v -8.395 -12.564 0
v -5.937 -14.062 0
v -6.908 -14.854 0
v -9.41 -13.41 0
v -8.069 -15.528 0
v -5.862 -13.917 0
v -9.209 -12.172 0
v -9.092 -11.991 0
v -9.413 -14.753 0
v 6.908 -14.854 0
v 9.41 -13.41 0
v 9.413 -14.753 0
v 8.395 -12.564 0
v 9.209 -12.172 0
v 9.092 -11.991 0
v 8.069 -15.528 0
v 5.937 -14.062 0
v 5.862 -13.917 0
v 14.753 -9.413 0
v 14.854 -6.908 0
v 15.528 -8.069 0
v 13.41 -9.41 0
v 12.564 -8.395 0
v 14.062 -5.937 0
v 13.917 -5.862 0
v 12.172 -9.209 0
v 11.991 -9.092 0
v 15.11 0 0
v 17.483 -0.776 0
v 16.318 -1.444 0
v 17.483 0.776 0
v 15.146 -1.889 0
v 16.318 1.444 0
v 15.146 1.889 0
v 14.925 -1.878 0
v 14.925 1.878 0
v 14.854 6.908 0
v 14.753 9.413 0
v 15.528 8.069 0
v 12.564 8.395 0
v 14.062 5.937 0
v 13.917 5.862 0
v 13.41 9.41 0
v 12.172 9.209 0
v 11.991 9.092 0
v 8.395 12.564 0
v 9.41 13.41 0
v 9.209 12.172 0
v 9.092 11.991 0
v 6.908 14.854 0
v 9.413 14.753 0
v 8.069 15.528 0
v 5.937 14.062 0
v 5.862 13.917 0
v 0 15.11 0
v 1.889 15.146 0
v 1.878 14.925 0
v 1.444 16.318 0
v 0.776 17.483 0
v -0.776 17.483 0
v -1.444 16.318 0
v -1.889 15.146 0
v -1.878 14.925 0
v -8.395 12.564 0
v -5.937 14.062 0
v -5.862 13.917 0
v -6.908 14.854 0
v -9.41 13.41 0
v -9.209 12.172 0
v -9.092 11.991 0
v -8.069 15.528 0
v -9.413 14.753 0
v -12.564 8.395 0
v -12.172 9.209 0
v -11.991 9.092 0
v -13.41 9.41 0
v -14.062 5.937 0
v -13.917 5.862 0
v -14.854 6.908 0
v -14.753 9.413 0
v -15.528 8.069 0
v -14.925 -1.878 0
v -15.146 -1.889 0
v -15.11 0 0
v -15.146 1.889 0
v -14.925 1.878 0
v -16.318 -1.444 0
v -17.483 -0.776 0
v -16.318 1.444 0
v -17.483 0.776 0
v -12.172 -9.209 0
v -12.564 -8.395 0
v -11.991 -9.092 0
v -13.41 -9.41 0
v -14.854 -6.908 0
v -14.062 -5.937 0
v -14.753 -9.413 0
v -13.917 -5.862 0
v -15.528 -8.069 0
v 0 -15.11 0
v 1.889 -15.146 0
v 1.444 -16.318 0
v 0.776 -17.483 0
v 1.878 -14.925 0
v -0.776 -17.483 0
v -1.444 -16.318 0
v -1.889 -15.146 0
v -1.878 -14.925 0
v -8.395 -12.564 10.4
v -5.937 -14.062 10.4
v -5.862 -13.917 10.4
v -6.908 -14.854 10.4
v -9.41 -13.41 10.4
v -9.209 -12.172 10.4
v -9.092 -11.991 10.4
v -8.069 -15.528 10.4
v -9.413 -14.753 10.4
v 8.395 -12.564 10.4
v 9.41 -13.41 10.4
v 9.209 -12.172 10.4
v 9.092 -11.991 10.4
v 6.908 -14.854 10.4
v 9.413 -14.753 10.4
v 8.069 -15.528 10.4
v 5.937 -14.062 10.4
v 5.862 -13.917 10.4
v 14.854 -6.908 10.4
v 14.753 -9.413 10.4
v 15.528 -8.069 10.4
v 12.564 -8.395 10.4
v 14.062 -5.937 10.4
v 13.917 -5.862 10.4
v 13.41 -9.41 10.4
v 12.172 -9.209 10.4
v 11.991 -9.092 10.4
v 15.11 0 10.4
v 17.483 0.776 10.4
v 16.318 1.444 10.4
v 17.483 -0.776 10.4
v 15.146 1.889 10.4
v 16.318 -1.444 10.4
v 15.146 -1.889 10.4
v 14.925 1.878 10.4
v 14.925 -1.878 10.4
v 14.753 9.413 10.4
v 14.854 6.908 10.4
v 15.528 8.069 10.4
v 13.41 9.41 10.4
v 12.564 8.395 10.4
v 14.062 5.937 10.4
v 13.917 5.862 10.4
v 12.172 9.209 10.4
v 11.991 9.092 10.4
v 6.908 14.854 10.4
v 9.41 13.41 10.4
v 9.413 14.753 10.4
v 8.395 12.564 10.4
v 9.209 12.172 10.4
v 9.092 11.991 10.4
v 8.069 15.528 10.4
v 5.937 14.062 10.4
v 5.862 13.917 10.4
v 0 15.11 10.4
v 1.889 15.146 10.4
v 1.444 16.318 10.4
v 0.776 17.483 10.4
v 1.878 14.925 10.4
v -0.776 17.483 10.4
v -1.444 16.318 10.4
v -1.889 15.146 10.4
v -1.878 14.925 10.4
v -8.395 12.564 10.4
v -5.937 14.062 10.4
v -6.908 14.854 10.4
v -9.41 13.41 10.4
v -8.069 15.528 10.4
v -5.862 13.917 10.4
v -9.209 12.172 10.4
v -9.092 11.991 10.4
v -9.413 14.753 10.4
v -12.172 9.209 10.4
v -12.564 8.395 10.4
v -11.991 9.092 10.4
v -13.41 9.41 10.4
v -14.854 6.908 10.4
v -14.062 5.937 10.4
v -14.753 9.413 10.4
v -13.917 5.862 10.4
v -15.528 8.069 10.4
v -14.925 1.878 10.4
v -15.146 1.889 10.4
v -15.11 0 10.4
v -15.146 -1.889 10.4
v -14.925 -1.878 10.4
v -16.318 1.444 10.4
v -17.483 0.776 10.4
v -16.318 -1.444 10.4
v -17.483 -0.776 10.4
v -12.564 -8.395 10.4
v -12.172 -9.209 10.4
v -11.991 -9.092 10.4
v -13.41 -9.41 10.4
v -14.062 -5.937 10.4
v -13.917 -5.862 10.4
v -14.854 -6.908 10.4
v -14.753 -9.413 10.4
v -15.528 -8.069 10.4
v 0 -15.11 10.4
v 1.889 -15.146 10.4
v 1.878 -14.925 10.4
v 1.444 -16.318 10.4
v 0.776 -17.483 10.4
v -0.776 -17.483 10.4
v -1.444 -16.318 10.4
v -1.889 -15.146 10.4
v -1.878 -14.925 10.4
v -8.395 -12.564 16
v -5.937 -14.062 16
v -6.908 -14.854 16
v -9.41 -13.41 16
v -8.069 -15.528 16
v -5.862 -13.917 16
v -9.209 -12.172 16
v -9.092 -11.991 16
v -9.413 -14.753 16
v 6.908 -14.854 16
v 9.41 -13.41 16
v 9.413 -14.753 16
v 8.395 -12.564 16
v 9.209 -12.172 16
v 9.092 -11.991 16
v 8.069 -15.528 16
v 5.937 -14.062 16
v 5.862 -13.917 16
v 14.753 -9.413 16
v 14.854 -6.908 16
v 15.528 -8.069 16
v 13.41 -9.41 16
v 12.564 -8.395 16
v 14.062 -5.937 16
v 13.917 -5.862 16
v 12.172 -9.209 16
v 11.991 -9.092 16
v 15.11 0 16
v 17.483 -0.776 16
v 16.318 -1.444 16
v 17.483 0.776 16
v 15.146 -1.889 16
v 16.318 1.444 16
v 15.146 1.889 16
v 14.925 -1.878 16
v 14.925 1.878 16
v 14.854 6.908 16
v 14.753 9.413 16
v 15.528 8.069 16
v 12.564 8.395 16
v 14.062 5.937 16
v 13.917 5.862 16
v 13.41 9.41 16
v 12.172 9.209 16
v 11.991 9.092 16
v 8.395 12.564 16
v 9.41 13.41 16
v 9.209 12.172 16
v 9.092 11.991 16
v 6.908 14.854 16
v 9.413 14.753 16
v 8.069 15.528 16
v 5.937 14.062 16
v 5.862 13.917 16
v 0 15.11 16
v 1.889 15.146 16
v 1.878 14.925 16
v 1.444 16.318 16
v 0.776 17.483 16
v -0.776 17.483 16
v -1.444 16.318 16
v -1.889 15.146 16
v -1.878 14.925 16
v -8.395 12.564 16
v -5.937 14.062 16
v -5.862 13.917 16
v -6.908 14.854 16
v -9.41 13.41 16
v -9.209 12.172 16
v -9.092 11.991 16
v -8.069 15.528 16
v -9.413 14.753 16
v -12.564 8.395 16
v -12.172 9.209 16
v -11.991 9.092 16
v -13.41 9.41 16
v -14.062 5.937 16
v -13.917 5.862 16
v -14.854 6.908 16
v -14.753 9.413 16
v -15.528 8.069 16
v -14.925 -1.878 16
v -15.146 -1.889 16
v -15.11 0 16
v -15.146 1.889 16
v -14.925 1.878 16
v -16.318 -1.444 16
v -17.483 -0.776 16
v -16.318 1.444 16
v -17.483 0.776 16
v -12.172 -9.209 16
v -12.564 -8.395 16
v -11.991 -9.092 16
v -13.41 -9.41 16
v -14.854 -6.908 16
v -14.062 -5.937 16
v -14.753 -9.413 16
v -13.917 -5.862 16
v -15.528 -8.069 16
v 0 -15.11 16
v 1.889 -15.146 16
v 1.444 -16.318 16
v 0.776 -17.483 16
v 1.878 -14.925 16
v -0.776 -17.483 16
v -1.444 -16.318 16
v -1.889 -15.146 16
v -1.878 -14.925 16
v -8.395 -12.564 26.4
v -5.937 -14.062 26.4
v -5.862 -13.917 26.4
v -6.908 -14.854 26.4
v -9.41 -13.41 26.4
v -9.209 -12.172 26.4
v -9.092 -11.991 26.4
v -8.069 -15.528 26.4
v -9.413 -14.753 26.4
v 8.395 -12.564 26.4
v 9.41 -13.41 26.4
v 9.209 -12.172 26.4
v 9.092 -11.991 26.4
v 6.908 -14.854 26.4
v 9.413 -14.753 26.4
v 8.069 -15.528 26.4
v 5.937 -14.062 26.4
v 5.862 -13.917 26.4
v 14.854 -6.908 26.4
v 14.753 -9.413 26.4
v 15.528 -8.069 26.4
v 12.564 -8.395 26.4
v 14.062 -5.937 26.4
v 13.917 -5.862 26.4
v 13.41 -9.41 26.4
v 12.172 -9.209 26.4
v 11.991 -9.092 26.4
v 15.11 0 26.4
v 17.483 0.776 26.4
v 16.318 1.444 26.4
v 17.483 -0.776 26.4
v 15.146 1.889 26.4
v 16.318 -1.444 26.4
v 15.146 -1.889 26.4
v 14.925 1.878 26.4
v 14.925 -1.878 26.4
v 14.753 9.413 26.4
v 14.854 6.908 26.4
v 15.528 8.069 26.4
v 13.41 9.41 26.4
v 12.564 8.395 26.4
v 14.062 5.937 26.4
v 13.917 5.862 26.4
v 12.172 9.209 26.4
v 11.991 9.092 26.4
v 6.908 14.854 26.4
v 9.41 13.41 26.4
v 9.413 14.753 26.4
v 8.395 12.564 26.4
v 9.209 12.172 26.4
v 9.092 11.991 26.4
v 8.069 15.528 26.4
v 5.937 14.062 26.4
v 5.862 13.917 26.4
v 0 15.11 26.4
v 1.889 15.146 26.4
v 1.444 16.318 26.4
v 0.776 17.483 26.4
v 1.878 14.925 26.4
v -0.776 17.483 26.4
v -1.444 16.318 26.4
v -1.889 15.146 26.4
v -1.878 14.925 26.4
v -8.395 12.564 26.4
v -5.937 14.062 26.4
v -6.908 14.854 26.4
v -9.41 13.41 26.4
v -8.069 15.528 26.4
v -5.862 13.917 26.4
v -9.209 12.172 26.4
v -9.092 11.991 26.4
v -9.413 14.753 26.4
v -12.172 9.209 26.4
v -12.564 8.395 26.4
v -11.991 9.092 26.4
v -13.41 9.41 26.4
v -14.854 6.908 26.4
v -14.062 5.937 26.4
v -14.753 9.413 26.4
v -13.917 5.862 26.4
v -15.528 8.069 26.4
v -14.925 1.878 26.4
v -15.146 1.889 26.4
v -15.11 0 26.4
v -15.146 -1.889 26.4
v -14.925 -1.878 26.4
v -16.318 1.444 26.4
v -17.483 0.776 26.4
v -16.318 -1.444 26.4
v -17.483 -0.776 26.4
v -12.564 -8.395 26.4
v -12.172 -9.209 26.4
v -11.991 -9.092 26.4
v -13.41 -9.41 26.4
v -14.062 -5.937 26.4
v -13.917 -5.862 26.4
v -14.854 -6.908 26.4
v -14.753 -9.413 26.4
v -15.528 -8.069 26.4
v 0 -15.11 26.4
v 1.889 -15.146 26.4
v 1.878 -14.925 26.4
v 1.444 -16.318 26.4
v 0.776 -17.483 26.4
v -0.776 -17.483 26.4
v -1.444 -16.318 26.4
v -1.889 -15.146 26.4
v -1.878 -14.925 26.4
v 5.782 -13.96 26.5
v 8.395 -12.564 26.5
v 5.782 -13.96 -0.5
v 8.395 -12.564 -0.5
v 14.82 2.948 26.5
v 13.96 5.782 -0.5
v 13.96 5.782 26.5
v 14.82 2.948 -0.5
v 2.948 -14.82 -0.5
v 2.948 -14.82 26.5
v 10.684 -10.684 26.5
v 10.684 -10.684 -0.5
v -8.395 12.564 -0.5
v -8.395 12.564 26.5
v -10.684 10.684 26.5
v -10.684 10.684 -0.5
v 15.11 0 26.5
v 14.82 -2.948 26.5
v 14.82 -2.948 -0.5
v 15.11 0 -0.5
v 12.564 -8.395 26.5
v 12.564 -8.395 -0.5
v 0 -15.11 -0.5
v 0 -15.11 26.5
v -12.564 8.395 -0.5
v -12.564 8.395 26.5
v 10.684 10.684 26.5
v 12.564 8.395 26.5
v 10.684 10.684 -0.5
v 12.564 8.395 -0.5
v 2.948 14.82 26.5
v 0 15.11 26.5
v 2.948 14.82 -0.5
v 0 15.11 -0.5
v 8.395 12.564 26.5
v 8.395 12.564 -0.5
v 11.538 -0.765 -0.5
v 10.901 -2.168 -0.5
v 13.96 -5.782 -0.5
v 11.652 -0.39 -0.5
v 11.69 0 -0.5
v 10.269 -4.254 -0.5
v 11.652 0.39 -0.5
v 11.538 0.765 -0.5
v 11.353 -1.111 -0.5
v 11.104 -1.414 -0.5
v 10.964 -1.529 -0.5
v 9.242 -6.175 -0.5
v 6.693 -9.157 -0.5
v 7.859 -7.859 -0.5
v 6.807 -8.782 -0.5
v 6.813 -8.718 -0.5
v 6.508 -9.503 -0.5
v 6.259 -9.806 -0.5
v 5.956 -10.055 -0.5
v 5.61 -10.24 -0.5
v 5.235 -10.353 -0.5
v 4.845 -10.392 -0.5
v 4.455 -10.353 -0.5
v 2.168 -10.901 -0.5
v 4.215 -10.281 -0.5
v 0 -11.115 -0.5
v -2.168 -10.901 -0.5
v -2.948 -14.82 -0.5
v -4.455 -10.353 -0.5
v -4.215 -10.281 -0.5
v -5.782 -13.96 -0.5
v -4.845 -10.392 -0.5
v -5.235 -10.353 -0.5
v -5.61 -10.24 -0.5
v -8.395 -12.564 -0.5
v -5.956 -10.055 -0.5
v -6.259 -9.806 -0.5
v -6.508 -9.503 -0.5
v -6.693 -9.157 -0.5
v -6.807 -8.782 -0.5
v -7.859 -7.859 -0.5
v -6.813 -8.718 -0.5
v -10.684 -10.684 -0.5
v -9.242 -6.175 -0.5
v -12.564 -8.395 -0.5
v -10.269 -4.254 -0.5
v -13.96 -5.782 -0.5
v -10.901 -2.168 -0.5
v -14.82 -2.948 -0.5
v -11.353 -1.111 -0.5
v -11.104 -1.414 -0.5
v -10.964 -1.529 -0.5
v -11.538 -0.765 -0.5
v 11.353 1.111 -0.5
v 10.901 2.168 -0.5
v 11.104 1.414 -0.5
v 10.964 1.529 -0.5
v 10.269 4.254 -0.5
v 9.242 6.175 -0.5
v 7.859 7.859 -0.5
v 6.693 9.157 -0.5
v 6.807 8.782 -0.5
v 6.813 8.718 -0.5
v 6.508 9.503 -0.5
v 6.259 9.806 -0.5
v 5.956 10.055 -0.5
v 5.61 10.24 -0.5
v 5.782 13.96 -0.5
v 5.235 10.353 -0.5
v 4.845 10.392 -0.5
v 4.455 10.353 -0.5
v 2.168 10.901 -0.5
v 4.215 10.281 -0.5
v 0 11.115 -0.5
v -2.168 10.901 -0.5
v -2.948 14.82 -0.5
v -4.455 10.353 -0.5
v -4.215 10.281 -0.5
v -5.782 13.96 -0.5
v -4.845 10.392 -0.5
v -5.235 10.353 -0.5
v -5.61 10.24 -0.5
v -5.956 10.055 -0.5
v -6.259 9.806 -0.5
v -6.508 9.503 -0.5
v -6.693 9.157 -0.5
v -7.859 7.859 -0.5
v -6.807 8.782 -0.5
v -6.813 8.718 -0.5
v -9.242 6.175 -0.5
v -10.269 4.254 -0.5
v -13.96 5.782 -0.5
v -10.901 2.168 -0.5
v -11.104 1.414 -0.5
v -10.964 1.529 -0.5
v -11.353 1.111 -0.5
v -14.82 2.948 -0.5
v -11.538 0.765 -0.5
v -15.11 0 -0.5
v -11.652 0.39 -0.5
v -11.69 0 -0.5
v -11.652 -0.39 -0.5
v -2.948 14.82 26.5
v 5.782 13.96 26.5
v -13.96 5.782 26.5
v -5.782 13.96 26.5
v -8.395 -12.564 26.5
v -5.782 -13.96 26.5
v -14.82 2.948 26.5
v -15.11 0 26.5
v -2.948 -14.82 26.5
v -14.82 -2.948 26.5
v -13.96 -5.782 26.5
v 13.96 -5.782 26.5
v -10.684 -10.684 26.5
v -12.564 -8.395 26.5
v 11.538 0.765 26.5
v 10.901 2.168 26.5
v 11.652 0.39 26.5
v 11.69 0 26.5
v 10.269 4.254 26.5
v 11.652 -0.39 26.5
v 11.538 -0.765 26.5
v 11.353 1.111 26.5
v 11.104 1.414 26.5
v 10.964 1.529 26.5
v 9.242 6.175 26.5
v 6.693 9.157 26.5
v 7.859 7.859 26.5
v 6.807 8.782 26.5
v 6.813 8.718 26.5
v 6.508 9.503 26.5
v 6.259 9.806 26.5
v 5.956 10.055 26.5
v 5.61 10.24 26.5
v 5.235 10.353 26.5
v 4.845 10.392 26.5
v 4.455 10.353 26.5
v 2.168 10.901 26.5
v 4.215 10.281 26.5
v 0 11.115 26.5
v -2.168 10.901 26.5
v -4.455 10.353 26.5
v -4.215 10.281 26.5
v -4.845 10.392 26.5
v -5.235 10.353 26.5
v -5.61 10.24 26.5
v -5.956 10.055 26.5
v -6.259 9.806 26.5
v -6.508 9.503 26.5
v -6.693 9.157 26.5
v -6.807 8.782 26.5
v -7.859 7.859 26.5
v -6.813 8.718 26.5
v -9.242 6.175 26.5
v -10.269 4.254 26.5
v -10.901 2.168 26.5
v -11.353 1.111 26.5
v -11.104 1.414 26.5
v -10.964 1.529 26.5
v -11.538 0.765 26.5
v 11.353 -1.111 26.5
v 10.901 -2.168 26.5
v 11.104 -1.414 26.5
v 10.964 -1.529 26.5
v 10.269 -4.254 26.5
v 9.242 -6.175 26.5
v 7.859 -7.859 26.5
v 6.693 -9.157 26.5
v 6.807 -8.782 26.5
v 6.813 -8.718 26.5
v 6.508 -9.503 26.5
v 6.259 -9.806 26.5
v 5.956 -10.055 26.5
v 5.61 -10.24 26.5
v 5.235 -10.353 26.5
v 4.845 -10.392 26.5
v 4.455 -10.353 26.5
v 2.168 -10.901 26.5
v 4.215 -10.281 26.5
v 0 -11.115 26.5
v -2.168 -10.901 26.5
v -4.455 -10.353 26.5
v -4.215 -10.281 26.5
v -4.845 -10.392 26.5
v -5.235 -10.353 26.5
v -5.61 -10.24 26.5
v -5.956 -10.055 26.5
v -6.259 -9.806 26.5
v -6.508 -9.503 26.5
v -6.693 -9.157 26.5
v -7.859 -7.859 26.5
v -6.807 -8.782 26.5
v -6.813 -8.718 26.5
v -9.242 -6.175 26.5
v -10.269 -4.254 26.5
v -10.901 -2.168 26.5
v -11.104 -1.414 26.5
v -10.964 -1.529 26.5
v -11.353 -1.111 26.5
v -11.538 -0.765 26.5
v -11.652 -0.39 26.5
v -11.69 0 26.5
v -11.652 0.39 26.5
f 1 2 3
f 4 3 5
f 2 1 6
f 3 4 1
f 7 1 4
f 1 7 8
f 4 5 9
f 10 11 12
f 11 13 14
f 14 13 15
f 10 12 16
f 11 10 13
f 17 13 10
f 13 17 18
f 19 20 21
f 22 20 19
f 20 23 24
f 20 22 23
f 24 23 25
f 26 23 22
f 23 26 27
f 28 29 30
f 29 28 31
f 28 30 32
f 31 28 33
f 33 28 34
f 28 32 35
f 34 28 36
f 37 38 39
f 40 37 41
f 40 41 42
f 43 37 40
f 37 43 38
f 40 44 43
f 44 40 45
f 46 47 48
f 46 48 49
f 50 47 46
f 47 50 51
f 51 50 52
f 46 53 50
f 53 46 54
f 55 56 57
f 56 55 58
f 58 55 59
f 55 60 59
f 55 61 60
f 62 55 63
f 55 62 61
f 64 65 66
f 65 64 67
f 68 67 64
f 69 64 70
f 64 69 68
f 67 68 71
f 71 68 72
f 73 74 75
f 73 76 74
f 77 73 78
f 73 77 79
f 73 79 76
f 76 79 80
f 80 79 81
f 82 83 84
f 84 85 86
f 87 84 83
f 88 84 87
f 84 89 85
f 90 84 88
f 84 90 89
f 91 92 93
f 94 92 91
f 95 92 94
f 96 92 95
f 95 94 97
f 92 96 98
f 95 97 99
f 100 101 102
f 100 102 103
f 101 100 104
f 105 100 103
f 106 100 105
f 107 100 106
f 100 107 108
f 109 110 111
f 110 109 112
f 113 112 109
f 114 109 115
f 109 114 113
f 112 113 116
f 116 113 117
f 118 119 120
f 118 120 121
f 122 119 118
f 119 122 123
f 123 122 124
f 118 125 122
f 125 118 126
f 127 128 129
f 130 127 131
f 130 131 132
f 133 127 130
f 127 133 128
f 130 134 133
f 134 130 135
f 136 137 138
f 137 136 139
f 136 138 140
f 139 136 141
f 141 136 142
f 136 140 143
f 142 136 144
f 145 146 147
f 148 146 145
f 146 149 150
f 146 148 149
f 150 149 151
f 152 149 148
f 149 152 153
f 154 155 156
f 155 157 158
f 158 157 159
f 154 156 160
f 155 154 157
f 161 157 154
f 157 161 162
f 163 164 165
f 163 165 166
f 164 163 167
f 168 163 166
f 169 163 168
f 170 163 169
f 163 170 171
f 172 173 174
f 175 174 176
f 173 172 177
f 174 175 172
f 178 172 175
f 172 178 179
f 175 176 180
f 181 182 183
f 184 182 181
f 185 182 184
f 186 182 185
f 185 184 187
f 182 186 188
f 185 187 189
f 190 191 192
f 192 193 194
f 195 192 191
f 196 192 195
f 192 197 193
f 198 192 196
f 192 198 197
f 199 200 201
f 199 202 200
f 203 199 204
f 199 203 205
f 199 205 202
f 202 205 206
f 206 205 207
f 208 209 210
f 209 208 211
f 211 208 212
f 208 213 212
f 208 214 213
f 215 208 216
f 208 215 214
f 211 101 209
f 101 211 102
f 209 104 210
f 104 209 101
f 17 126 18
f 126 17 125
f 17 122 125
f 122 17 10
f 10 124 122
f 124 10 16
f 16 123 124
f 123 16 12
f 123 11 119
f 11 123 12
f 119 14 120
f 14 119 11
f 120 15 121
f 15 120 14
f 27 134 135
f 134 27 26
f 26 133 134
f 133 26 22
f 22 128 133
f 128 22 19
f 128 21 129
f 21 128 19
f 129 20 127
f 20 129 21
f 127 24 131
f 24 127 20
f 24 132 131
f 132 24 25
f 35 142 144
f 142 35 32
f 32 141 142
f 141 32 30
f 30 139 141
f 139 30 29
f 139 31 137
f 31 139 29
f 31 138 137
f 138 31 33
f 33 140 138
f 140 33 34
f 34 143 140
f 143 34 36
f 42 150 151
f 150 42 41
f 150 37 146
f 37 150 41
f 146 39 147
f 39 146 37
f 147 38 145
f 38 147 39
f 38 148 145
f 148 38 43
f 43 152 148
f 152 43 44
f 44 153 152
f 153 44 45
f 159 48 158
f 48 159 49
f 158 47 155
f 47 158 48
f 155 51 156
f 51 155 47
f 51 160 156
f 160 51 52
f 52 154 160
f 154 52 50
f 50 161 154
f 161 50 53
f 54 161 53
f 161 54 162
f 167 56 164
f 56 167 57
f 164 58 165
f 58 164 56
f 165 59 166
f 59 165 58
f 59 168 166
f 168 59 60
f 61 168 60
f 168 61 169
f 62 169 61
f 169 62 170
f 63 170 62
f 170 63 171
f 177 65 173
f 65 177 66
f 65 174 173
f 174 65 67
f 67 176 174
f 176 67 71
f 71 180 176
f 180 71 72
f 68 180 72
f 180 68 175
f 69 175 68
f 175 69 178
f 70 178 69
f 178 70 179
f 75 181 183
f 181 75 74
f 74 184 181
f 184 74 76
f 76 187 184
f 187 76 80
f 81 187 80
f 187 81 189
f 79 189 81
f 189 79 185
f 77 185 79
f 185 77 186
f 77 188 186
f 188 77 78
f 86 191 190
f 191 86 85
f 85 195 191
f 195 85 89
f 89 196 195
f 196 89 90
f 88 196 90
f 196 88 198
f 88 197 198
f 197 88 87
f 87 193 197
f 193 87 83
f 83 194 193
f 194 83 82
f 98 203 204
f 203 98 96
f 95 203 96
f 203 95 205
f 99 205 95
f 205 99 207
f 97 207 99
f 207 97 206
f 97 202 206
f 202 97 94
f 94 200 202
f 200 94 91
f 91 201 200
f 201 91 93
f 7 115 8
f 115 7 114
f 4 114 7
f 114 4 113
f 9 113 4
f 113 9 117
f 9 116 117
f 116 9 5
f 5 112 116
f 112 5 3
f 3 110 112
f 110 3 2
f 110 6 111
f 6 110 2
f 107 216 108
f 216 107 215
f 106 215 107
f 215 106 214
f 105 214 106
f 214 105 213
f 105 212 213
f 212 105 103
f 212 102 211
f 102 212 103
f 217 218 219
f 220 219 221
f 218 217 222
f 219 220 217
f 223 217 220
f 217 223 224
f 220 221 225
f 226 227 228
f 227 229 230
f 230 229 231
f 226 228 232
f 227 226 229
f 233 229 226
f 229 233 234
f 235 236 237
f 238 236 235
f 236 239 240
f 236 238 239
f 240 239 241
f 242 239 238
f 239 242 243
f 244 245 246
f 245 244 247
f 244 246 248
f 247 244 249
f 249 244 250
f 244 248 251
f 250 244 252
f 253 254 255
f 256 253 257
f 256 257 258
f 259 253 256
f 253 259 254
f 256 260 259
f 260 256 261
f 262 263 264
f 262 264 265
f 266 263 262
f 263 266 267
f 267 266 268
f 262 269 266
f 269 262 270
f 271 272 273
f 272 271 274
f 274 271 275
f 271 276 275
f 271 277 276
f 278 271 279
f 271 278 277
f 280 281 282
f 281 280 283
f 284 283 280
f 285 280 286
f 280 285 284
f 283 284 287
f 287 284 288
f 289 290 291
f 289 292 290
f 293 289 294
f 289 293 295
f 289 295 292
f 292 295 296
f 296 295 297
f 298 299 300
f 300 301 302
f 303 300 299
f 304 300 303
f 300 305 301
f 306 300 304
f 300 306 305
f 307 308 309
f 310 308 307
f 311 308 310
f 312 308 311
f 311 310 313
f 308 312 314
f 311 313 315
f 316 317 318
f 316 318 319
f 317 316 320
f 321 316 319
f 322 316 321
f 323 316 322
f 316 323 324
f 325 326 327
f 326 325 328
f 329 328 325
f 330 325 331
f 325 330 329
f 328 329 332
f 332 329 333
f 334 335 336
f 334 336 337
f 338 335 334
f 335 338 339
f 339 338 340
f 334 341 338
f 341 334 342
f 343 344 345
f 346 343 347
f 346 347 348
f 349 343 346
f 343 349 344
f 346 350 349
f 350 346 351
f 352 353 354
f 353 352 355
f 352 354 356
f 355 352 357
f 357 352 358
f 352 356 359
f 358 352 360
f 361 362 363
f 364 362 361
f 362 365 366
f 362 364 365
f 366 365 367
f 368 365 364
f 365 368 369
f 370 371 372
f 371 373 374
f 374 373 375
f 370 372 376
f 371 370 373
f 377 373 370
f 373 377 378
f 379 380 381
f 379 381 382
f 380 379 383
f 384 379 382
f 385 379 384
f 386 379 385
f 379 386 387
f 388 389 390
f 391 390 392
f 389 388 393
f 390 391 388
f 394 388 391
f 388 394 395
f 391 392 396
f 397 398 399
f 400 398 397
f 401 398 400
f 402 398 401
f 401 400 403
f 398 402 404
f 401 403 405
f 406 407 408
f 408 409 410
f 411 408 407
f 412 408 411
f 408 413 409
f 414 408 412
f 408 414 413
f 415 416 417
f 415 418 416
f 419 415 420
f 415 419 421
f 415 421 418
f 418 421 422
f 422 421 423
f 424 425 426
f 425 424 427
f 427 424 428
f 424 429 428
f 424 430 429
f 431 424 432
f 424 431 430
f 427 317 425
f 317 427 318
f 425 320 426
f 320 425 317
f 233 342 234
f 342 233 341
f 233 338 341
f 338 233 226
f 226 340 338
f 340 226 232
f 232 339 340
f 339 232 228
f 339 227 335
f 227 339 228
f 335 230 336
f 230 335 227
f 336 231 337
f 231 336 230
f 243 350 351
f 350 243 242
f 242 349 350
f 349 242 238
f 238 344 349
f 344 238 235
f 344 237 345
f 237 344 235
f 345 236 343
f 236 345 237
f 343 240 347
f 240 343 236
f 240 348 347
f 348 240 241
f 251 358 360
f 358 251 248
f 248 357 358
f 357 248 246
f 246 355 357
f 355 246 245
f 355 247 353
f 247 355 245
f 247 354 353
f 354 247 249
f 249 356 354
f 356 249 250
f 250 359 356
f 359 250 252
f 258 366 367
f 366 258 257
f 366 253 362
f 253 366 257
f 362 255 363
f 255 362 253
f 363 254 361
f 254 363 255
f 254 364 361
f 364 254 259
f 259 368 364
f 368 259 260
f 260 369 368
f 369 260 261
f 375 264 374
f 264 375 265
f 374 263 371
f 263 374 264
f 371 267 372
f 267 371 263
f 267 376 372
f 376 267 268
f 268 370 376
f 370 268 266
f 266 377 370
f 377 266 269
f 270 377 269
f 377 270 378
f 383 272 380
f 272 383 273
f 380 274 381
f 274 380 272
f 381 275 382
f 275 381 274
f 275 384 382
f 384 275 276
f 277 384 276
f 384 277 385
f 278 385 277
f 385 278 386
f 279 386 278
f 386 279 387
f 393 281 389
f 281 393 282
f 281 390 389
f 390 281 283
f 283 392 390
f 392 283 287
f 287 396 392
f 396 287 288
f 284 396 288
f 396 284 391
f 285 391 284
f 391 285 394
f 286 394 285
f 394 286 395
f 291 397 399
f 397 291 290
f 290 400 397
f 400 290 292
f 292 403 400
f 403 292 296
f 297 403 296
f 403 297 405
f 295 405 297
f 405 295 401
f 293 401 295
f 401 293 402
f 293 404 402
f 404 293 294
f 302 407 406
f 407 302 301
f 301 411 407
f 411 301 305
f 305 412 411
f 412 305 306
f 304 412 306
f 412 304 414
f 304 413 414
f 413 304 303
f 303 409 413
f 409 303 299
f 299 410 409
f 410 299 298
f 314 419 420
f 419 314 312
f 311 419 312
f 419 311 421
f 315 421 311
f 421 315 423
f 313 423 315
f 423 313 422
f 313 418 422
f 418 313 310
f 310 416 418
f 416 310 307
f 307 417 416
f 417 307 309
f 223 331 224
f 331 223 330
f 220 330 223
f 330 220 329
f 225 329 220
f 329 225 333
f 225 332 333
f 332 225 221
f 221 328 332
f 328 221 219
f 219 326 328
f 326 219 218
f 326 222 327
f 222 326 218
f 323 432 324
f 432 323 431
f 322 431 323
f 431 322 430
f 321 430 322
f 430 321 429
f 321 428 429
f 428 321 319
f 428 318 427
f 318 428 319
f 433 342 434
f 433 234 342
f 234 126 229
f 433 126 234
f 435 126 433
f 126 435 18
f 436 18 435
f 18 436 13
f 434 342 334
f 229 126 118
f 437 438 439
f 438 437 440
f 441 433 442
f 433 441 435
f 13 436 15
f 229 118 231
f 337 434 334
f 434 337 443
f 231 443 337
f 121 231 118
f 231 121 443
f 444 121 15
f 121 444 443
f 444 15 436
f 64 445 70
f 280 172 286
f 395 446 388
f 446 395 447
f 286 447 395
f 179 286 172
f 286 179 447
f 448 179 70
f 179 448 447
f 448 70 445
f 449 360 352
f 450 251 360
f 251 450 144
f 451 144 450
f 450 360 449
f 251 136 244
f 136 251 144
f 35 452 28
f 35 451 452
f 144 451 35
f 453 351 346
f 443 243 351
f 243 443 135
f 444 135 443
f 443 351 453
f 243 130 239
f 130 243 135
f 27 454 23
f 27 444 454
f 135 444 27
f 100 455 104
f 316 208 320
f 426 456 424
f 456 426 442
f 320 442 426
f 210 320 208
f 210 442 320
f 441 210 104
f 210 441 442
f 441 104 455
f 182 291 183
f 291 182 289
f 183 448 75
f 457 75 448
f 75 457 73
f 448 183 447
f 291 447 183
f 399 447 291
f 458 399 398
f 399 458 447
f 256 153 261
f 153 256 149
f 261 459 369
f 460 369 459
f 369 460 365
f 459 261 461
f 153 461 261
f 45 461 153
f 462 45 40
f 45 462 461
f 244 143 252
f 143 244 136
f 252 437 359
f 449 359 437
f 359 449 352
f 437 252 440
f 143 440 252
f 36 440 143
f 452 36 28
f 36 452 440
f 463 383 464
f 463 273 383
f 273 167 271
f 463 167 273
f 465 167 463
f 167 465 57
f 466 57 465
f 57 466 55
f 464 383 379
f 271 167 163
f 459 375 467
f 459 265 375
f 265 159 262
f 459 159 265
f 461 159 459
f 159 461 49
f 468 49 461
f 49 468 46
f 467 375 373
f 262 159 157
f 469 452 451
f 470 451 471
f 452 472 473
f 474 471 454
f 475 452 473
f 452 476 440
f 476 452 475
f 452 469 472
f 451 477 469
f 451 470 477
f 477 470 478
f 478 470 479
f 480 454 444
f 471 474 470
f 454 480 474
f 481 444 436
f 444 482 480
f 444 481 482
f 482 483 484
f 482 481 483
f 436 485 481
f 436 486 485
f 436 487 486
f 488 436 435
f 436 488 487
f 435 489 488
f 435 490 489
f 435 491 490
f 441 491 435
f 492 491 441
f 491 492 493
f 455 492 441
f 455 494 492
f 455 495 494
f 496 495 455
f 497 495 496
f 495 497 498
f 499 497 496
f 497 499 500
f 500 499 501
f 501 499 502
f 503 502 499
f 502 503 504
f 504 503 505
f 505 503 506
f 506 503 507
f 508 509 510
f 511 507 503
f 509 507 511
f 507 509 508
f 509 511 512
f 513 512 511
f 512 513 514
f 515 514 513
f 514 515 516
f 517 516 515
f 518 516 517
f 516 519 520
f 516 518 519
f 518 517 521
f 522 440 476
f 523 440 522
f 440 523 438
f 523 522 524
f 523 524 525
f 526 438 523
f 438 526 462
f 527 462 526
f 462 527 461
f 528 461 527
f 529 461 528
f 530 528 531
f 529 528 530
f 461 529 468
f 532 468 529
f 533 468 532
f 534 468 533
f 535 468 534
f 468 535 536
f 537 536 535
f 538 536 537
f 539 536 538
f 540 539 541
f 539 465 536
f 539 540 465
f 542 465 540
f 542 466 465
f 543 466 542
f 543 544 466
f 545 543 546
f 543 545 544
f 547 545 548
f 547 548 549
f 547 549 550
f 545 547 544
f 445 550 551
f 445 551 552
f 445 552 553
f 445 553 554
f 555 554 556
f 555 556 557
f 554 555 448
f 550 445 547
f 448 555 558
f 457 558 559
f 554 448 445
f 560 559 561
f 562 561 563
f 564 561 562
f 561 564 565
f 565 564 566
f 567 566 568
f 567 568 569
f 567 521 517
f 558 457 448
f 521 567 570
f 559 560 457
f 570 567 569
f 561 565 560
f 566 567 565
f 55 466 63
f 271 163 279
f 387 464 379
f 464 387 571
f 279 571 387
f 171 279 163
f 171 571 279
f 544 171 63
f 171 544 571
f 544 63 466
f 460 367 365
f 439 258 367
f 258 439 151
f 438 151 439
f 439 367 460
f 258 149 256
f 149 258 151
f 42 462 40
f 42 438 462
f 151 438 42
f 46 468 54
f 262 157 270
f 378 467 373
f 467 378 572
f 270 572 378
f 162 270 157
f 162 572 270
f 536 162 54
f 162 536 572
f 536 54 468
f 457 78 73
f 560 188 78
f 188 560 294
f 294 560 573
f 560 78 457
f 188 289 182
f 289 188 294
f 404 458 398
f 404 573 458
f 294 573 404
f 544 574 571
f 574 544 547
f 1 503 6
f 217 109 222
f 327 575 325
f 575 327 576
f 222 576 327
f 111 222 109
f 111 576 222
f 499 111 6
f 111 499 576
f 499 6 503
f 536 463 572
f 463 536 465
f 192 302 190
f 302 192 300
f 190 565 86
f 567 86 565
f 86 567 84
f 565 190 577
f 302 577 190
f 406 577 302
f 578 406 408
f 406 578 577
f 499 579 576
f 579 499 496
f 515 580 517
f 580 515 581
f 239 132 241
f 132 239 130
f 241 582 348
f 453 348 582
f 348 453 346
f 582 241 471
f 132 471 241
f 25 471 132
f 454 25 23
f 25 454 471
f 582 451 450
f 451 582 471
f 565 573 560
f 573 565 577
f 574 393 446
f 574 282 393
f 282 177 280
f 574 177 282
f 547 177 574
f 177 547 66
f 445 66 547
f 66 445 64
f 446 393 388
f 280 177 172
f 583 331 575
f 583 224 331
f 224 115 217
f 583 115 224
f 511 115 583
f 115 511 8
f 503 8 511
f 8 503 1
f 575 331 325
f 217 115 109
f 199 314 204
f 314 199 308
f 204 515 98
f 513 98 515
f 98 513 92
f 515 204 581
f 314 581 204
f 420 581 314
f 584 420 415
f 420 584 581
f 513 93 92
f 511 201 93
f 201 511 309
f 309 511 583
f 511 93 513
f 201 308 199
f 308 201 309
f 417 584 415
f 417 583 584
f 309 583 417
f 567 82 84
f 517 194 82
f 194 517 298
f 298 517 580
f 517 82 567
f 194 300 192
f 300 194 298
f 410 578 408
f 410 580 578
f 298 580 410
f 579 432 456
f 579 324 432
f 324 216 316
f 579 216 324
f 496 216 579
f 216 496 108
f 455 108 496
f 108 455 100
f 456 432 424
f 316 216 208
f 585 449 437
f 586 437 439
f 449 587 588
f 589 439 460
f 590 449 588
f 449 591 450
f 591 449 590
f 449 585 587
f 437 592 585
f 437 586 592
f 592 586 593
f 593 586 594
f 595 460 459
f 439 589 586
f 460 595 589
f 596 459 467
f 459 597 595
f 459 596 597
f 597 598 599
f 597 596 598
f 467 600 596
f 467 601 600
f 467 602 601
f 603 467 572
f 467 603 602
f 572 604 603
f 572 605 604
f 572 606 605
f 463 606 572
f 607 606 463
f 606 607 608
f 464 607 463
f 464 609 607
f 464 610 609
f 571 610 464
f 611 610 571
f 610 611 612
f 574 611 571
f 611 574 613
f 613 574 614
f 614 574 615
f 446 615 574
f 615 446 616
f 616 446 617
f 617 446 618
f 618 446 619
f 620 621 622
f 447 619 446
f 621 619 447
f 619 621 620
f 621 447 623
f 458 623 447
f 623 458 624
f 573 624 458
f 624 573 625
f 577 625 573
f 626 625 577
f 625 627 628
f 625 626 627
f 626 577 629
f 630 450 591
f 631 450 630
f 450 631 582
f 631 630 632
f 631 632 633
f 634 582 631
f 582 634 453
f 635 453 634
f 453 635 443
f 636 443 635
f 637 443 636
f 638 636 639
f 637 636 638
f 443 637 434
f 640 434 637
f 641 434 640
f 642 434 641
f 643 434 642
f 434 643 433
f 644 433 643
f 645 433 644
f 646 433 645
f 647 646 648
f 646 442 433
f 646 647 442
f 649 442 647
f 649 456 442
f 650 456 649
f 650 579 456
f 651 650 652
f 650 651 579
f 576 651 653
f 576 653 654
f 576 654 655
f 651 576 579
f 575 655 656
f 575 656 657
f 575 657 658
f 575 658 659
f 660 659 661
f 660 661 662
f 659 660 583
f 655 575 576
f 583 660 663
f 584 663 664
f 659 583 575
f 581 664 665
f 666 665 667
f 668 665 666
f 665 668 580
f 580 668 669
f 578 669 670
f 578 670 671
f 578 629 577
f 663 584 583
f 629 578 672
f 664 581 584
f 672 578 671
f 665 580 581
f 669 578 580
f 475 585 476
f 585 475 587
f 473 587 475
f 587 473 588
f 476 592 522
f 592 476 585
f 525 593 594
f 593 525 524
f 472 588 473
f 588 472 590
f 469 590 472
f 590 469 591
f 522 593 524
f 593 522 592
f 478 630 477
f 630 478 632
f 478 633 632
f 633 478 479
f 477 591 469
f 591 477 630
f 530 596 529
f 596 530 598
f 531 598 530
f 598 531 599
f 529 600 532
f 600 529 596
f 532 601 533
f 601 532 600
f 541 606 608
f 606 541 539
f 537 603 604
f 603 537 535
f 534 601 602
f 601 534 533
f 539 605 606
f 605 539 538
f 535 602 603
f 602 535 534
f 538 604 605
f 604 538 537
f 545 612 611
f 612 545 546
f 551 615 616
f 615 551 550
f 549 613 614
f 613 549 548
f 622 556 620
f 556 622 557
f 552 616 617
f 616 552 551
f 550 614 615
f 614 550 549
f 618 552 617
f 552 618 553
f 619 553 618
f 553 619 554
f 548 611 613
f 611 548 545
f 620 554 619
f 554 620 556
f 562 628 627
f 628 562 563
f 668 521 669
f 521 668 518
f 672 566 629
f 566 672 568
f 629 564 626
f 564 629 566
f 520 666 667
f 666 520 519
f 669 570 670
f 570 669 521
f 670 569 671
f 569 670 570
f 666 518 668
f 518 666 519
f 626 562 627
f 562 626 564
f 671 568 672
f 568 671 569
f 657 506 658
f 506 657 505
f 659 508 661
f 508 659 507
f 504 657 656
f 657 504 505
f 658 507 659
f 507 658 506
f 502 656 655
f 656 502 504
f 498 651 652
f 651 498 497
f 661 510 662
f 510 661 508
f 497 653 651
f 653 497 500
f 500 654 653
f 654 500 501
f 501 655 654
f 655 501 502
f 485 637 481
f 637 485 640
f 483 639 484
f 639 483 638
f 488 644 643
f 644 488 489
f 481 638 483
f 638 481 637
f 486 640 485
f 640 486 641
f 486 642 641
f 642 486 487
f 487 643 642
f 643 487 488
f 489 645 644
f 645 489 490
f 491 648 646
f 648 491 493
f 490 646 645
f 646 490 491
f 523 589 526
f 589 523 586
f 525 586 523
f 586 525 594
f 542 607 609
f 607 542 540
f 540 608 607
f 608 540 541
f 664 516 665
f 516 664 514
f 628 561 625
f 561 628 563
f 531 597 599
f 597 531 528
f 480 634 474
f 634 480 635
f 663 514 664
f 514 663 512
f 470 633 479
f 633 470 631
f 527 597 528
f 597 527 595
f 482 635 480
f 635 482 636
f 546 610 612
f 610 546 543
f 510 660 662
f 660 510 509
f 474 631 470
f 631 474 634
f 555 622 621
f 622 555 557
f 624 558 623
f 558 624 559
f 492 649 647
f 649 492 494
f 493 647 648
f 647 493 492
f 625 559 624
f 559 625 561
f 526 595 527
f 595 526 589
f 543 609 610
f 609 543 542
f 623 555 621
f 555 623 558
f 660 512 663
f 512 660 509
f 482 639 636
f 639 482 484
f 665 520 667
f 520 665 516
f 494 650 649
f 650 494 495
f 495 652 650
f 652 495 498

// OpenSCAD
$fn = 32;

// ----------------------------------------------------------------------
// Two-module gear rim: z12 m2.5 and z12 m2.5, 26 mm wide
// ----------------------------------------------------------------------

// --- parameters (mm) ---
module_a = 2.5;           // first tooth module
teeth_a = 12;             // first band tooth count
module_b = 2.5;           // second tooth module
teeth_b = 12;             // second band tooth count
band_h = 10;              // height of one tooth band
web_t = 6;                // web thickness between the bands
total = 26;               // overall width over both bands
root_r = 11.88;           // root radius of the coarse band
hub_r = 15.11;            // hub radius
bore_d = 22.23;           // hub bore
hole_count = 6;           // lightening holes
hole_r = 9.69;            // lightening hole circle radius
hole_d = 4;               // lightening hole diameter

band_a = [[11.749, -1.723], [15.146, -1.889], [16.318, -1.444], [17.483, -0.776], [17.483, 0.776], [16.318, 1.444], [15.146, 1.889], [11.749, 1.723], [11.037, 4.383], [14.062, 5.937], [14.854, 6.908], [15.528, 8.069], [14.753, 9.413], [13.41, 9.41], [12.172, 9.209], [9.314, 7.367], [7.367, 9.314], [9.209, 12.172], [9.41, 13.41], [9.413, 14.753], [8.069, 15.528], [6.908, 14.854], [5.937, 14.062], [4.383, 11.037], [1.723, 11.749], [1.889, 15.146], [1.444, 16.318], [0.776, 17.483], [-0.776, 17.483], [-1.444, 16.318], [-1.889, 15.146], [-1.723, 11.749], [-4.383, 11.037], [-5.937, 14.062], [-6.908, 14.854], [-8.069, 15.528], [-9.413, 14.753], [-9.41, 13.41], [-9.209, 12.172], [-7.367, 9.314], [-9.314, 7.367], [-12.172, 9.209], [-13.41, 9.41], [-14.753, 9.413], [-15.528, 8.069], [-14.854, 6.908], [-14.062, 5.937], [-11.037, 4.383], [-11.749, 1.723], [-15.146, 1.889], [-16.318, 1.444], [-17.483, 0.776], [-17.483, -0.776], [-16.318, -1.444], [-15.146, -1.889], [-11.749, -1.723], [-11.037, -4.383], [-14.062, -5.937], [-14.854, -6.908], [-15.528, -8.069], [-14.753, -9.413], [-13.41, -9.41], [-12.172, -9.209], [-9.314, -7.367], [-7.367, -9.314], [-9.209, -12.172], [-9.41, -13.41], [-9.413, -14.753], [-8.069, -15.528], [-6.908, -14.854], [-5.937, -14.062], [-4.383, -11.037], [-1.723, -11.749], [-1.889, -15.146], [-1.444, -16.318], [-0.776, -17.483], [0.776, -17.483], [1.444, -16.318], [1.889, -15.146], [1.723, -11.749], [4.383, -11.037], [5.937, -14.062], [6.908, -14.854], [8.069, -15.528], [9.413, -14.753], [9.41, -13.41], [9.209, -12.172], [7.367, -9.314], [9.314, -7.367], [12.172, -9.209], [13.41, -9.41], [14.753, -9.413], [15.528, -8.069], [14.854, -6.908], [14.062, -5.937], [11.037, -4.383]];
band_b = [[11.749, -1.723], [15.146, -1.889], [16.318, -1.444], [17.483, -0.776], [17.483, 0.776], [16.318, 1.444], [15.146, 1.889], [11.749, 1.723], [11.037, 4.383], [14.062, 5.937], [14.854, 6.908], [15.528, 8.069], [14.753, 9.413], [13.41, 9.41], [12.172, 9.209], [9.314, 7.367], [7.367, 9.314], [9.209, 12.172], [9.41, 13.41], [9.413, 14.753], [8.069, 15.528], [6.908, 14.854], [5.937, 14.062], [4.383, 11.037], [1.723, 11.749], [1.889, 15.146], [1.444, 16.318], [0.776, 17.483], [-0.776, 17.483], [-1.444, 16.318], [-1.889, 15.146], [-1.723, 11.749], [-4.383, 11.037], [-5.937, 14.062], [-6.908, 14.854], [-8.069, 15.528], [-9.413, 14.753], [-9.41, 13.41], [-9.209, 12.172], [-7.367, 9.314], [-9.314, 7.367], [-12.172, 9.209], [-13.41, 9.41], [-14.753, 9.413], [-15.528, 8.069], [-14.854, 6.908], [-14.062, 5.937], [-11.037, 4.383], [-11.749, 1.723], [-15.146, 1.889], [-16.318, 1.444], [-17.483, 0.776], [-17.483, -0.776], [-16.318, -1.444], [-15.146, -1.889], [-11.749, -1.723], [-11.037, -4.383], [-14.062, -5.937], [-14.854, -6.908], [-15.528, -8.069], [-14.753, -9.413], [-13.41, -9.41], [-12.172, -9.209], [-9.314, -7.367], [-7.367, -9.314], [-9.209, -12.172], [-9.41, -13.41], [-9.413, -14.753], [-8.069, -15.528], [-6.908, -14.854], [-5.937, -14.062], [-4.383, -11.037], [-1.723, -11.749], [-1.889, -15.146], [-1.444, -16.318], [-0.776, -17.483], [0.776, -17.483], [1.444, -16.318], [1.889, -15.146], [1.723, -11.749], [4.383, -11.037], [5.937, -14.062], [6.908, -14.854], [8.069, -15.528], [9.413, -14.753], [9.41, -13.41], [9.209, -12.172], [7.367, -9.314], [9.314, -7.367], [12.172, -9.209], [13.41, -9.41], [14.753, -9.413], [15.528, -8.069], [14.854, -6.908], [14.062, -5.937], [11.037, -4.383]];

difference() {
  union() {
    /* tooth band A, overlapping the web by 0.4 mm */
    linear_extrude(height = band_h + 0.4) polygon(band_a);
    /* web */
    translate([0, 0, band_h - 0.4]) cylinder(h = web_t + 0.8, d = 2 * root_r);
    /* tooth band B */
    translate([0, 0, band_h + web_t]) linear_extrude(height = band_h + 0.4) polygon(band_b);
    /* hub */
    translate([0, 0, -0.5]) cylinder(h = total + 1.0, d = 2 * hub_r);
  }
  /* bore */
  translate([0, 0, -2.5]) cylinder(h = total + 5, d = bore_d);
  /* lightening holes through the web */
  for (i = [0 : hole_count - 1]) {
    a = i * 360 / hole_count;
    translate([hole_r * cos(a), hole_r * sin(a), -2.5]) cylinder(h = total + 5, d = hole_d);
  }
}
